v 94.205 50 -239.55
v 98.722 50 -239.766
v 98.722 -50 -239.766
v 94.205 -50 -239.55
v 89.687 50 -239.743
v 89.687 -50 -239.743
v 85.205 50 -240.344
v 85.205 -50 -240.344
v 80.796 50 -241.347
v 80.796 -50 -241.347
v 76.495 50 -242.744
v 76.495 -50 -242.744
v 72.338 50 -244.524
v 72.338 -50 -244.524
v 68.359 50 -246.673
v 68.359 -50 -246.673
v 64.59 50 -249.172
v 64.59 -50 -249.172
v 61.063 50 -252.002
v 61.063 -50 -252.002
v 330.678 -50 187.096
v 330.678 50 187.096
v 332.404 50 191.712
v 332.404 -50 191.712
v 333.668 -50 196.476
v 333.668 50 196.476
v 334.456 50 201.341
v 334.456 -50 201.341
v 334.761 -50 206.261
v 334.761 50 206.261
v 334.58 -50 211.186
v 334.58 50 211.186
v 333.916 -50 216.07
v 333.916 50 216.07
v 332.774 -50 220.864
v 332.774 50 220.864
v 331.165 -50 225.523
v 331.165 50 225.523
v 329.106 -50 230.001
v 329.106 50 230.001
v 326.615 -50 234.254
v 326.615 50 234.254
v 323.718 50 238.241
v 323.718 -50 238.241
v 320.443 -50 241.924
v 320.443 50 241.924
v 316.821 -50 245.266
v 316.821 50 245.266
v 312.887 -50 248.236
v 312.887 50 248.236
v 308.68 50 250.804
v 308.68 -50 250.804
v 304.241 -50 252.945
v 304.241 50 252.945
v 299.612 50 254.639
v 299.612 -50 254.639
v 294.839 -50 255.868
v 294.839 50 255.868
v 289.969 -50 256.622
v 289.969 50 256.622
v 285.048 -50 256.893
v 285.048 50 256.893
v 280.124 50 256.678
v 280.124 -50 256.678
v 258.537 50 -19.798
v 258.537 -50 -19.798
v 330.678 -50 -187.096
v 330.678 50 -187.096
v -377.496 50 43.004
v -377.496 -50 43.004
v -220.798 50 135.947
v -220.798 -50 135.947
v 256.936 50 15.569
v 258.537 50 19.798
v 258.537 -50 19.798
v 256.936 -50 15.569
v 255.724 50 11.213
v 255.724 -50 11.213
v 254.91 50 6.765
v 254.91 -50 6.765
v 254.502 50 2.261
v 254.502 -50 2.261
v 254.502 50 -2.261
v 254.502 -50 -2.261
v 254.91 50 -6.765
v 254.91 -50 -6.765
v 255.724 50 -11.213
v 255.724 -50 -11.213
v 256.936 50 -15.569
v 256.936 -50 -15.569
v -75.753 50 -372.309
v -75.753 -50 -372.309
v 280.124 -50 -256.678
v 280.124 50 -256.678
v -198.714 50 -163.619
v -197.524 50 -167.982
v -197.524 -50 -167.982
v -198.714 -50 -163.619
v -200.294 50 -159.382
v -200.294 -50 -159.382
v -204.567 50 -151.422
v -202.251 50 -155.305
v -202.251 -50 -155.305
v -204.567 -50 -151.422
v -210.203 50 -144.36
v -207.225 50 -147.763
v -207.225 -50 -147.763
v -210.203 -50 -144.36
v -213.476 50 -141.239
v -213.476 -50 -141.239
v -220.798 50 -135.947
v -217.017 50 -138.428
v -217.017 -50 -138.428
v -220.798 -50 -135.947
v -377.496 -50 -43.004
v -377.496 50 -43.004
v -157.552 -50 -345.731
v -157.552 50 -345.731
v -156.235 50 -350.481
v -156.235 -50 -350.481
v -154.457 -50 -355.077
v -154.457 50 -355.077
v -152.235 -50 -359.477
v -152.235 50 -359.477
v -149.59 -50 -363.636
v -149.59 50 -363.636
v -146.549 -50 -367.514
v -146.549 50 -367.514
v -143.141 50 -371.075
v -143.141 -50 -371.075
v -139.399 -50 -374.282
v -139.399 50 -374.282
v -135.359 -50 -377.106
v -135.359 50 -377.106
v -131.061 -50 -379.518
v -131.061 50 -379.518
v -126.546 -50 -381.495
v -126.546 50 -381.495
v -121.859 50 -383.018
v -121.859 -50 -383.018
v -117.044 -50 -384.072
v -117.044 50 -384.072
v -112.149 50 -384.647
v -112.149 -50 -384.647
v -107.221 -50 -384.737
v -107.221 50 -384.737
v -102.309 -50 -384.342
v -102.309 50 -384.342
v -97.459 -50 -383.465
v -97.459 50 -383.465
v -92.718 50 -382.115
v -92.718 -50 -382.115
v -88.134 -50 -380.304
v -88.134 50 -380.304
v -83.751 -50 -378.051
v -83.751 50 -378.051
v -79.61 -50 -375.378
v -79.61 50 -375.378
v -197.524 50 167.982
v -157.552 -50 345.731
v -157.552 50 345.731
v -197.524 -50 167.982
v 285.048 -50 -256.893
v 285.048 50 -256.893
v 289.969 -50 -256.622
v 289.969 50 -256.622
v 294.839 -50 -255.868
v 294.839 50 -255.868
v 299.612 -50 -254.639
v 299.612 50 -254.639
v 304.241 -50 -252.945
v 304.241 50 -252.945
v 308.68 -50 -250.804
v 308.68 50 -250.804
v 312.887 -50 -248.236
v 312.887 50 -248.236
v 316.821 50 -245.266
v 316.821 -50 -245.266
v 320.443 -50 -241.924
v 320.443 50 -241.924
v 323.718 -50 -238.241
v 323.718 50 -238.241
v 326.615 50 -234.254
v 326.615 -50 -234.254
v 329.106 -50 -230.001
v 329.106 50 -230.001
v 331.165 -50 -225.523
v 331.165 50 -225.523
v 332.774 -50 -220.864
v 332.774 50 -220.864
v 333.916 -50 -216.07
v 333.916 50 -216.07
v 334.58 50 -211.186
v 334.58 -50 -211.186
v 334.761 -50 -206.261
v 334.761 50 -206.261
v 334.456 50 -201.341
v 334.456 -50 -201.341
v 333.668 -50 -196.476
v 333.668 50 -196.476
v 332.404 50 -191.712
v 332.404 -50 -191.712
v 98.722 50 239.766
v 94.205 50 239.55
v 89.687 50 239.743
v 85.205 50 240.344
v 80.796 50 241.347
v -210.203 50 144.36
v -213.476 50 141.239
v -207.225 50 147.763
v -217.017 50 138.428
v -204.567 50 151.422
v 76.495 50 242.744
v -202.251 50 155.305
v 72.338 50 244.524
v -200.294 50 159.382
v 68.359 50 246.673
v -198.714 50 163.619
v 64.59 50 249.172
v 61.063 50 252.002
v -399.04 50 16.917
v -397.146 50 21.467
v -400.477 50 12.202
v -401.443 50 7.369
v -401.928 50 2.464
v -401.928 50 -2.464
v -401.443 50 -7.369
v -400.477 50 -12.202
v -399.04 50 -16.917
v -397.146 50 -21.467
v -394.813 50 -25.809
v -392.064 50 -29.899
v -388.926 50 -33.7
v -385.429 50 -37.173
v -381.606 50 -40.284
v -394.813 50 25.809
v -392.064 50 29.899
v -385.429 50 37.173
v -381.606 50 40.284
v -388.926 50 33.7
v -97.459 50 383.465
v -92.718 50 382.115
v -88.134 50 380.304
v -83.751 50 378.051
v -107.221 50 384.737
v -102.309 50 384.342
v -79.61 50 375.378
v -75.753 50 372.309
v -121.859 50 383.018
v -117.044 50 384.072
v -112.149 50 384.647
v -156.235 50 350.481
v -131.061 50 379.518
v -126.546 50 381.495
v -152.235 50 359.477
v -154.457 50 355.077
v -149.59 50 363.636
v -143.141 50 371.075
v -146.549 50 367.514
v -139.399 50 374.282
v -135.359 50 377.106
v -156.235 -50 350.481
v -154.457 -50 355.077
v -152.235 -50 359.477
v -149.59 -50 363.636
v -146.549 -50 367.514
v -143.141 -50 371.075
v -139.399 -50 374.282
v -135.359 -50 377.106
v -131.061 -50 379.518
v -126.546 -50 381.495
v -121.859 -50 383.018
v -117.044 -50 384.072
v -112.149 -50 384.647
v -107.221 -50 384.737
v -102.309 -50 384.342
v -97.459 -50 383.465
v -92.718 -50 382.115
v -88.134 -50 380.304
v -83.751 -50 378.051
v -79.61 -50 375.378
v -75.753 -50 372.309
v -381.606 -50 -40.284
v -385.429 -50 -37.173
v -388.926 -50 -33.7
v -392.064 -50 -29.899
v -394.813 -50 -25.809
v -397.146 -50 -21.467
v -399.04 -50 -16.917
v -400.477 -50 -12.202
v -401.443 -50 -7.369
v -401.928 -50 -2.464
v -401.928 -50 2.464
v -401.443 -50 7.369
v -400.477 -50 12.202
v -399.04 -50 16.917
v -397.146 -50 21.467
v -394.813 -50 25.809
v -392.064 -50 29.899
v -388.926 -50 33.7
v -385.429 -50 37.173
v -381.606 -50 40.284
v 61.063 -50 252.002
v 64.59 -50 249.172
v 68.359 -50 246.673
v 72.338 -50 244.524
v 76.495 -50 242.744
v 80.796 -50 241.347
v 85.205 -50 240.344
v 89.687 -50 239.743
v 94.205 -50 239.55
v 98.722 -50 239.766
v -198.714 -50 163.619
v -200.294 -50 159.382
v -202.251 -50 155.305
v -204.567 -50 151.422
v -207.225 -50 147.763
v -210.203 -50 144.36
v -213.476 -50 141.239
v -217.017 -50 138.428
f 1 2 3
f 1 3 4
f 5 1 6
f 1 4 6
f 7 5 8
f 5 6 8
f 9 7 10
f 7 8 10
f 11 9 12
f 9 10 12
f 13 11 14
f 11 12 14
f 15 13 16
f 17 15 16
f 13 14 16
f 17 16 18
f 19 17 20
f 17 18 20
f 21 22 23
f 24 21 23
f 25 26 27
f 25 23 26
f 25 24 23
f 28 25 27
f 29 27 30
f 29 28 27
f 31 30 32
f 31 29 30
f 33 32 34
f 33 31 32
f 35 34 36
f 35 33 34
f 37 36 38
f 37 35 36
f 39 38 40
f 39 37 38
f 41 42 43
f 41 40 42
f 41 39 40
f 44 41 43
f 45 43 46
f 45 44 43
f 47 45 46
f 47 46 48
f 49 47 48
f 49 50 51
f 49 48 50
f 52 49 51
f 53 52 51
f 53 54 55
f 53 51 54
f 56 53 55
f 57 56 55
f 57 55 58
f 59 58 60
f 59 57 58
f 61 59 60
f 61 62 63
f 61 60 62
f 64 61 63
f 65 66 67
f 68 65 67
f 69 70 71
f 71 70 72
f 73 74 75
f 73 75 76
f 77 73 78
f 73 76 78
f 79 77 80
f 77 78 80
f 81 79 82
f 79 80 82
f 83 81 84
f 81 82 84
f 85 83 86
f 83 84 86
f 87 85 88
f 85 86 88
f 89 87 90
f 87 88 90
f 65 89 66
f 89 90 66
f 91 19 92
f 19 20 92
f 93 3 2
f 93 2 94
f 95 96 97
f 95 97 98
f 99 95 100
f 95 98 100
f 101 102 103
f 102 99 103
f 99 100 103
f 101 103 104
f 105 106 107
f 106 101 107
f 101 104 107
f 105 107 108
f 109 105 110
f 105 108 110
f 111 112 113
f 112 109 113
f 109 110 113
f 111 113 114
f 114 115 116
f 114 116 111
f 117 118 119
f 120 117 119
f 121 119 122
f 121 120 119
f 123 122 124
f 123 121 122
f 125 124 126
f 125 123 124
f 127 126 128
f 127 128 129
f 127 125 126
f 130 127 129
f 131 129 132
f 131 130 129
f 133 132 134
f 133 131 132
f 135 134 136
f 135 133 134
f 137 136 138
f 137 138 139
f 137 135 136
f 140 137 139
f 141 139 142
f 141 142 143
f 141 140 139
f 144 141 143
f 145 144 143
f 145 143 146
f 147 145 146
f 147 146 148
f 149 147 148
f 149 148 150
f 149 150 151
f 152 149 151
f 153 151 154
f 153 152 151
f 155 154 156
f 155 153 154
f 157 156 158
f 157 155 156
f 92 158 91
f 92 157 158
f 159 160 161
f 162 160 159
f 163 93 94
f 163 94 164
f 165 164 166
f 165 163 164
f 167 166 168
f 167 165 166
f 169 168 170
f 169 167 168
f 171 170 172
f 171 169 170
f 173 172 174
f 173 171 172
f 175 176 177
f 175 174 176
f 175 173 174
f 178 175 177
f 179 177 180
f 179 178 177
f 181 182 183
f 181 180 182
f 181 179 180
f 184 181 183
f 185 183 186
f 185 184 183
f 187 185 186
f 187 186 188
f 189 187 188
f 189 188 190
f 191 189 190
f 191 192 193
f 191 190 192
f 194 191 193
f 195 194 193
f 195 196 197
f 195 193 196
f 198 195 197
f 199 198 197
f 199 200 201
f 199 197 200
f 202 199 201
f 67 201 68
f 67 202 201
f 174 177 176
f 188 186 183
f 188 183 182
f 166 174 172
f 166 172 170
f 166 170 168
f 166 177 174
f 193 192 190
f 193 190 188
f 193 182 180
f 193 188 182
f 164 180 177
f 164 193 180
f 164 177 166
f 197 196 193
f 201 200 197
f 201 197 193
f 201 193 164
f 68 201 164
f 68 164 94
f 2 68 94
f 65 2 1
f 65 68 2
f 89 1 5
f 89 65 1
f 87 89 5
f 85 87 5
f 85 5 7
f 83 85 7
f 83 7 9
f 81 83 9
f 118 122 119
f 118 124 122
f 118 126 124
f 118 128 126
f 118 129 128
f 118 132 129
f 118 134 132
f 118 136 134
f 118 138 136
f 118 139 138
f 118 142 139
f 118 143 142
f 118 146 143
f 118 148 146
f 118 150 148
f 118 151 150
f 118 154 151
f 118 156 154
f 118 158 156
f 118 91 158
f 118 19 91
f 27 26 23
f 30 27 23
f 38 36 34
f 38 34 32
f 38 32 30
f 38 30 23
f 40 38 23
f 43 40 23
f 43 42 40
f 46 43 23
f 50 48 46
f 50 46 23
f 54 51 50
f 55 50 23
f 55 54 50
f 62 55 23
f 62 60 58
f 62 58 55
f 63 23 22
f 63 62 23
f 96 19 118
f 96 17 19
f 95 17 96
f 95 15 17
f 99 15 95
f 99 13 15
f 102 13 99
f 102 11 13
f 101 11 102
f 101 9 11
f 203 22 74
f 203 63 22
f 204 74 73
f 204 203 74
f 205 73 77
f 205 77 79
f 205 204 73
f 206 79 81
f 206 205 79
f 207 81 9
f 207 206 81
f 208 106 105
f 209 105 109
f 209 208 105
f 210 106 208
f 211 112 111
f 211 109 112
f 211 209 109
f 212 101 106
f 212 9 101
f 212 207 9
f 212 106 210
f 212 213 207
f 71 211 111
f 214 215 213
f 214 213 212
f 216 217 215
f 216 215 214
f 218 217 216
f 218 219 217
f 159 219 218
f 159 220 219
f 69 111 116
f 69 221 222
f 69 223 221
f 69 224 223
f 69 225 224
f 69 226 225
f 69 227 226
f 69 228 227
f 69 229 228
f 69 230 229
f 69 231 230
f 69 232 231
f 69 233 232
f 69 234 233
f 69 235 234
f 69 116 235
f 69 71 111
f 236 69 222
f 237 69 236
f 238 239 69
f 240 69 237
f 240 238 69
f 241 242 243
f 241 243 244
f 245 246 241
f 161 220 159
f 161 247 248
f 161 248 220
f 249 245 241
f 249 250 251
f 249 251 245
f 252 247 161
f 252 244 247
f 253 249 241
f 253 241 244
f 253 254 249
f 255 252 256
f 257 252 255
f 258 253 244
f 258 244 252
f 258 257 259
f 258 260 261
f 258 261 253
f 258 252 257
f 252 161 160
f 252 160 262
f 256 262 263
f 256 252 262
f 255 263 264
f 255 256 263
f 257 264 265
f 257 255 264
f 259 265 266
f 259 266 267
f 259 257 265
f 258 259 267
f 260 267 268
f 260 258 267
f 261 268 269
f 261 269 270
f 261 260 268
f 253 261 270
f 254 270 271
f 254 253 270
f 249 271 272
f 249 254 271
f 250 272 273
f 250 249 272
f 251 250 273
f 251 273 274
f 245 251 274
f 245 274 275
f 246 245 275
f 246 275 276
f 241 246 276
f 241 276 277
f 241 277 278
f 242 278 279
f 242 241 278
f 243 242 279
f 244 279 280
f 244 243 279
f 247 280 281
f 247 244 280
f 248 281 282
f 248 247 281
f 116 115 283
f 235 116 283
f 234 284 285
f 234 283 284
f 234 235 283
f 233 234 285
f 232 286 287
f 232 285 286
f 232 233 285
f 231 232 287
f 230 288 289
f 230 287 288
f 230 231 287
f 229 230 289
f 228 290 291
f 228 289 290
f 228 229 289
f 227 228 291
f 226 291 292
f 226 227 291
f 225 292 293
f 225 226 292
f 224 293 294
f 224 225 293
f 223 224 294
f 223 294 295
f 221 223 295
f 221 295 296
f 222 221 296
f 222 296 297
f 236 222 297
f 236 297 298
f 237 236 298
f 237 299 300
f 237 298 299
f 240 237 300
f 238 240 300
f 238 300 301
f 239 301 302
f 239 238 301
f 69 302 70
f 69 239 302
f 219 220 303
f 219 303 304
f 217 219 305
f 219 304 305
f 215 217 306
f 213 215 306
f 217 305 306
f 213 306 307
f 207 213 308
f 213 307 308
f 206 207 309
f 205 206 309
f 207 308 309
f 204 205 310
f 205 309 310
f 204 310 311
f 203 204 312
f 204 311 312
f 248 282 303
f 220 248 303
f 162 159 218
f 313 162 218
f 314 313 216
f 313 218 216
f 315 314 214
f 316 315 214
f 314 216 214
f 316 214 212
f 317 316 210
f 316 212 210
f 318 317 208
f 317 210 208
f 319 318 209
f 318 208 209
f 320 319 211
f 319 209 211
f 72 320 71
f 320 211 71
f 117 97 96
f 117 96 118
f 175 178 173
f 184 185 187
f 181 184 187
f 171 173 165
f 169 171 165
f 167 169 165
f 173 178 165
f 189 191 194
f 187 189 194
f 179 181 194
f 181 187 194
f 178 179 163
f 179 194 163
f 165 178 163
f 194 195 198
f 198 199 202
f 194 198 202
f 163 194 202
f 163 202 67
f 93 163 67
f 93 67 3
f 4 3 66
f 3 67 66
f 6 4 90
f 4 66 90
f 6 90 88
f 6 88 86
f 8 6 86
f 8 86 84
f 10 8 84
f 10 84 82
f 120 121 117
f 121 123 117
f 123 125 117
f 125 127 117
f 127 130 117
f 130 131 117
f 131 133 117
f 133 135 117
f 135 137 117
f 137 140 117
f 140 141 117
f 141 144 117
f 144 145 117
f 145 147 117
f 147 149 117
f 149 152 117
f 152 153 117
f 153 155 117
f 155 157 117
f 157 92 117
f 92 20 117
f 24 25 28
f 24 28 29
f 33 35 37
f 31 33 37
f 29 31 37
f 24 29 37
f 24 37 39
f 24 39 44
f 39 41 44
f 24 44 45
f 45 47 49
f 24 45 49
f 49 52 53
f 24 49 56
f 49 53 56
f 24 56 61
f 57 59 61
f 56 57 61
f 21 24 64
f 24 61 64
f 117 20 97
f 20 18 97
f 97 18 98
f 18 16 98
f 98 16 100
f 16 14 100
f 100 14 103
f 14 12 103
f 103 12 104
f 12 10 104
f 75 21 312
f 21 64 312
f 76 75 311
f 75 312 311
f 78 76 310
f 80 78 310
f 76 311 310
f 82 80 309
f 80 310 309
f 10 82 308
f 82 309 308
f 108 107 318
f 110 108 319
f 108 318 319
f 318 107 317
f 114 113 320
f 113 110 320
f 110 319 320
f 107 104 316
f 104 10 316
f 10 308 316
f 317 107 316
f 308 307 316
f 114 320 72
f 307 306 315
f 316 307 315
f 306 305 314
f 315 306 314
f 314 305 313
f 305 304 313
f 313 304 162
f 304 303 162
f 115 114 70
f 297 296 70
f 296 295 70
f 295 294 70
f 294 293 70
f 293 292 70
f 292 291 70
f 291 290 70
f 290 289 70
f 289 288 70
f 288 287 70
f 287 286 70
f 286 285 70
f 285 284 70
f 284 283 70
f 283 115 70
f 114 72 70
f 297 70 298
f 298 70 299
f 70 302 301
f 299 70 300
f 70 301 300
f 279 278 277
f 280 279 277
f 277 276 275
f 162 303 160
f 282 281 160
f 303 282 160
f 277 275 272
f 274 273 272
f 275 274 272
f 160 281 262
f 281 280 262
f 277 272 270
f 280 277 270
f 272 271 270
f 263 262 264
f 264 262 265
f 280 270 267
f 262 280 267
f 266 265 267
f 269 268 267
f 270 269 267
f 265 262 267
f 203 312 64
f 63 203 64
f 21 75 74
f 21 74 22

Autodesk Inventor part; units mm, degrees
ref_plane "YZ Plane" through (0, 0, 0) normal (1, 0, 0) x (0, 1, 0)
ref_plane "XZ Plane" through (0, 0, 0) normal (0, 1, 0) x (-1, 0, 0)
ref_plane "XY Plane" through (0, 0, 0) normal (0, 0, 1) x (1, 0, 0)
sketch "Sketch2" plane through (0, 0, 0) normal (0, 1, 0) x (-1, 0, 0)
  line L0 (450, 0) -> (139.0576, -427.9754) construction
  line L1 (139.0576, -427.9754) -> (-364.0576, -264.5034) construction
  line L2 (-364.0576, -264.5034) -> (-364.0576, 264.5034) construction
  line L3 (-364.0576, 264.5034) -> (139.0576, 427.9754) construction
  line L4 (139.0576, 427.9754) -> (450, 0) construction
  circle A0 centre (0, 0) radius 450 construction
  line L5 (-250, 0) -> (-77.2542, 237.7641) construction
  line L6 (-77.2542, 237.7641) -> (202.2542, 146.9463) construction
  line L7 (202.2542, 146.9463) -> (202.2542, -146.9463) construction
  line L8 (202.2542, -146.9463) -> (-77.2542, -237.7641) construction
  line L9 (-77.2542, -237.7641) -> (-250, 0) construction
  circle A1 centre (0, 0) radius 250 construction
  line L10 (450, 0) -> (202.2542, 146.9463)
  line L11 (139.0576, 427.9754) -> (202.2542, 146.9463)
  line L12 (139.0576, 427.9754) -> (-77.2542, 237.7641)
  line L13 (-77.2542, 237.7641) -> (-364.0576, 264.5034)
  line L14 (-250, 0) -> (-364.0576, 264.5034)
  line L15 (-250, 0) -> (-364.0576, -264.5034)
  line L16 (-77.2542, -237.7641) -> (-364.0576, -264.5034)
  line L17 (202.2542, -146.9463) -> (139.0576, -427.9754)
  line L18 (-77.2542, -237.7641) -> (139.0576, -427.9754)
  line L19 (450, 0) -> (202.2542, -146.9463)
  dimension "d17" = 500
  dimension "d16" = 450
extrude "Extrusion2" add sketch "Sketch2" along normal mid plane 100
fillet "Fillet1" radius 50 1 edges at (-139.0576, 0, 427.9754)
fillet "Fillet2" radius 50 9 edges at (364.0576, 0, 264.5034) (364.0576, 0, -264.5034) (-139.0576, 0, -427.9754) (-450, 0, 0) (-202.2542, 0, -146.9463) (-202.2542, 0, 146.9463) (77.2542, 0, -237.7641) (250, 0, 0) (77.2542, 0, 237.7641)
properties part number "star"
